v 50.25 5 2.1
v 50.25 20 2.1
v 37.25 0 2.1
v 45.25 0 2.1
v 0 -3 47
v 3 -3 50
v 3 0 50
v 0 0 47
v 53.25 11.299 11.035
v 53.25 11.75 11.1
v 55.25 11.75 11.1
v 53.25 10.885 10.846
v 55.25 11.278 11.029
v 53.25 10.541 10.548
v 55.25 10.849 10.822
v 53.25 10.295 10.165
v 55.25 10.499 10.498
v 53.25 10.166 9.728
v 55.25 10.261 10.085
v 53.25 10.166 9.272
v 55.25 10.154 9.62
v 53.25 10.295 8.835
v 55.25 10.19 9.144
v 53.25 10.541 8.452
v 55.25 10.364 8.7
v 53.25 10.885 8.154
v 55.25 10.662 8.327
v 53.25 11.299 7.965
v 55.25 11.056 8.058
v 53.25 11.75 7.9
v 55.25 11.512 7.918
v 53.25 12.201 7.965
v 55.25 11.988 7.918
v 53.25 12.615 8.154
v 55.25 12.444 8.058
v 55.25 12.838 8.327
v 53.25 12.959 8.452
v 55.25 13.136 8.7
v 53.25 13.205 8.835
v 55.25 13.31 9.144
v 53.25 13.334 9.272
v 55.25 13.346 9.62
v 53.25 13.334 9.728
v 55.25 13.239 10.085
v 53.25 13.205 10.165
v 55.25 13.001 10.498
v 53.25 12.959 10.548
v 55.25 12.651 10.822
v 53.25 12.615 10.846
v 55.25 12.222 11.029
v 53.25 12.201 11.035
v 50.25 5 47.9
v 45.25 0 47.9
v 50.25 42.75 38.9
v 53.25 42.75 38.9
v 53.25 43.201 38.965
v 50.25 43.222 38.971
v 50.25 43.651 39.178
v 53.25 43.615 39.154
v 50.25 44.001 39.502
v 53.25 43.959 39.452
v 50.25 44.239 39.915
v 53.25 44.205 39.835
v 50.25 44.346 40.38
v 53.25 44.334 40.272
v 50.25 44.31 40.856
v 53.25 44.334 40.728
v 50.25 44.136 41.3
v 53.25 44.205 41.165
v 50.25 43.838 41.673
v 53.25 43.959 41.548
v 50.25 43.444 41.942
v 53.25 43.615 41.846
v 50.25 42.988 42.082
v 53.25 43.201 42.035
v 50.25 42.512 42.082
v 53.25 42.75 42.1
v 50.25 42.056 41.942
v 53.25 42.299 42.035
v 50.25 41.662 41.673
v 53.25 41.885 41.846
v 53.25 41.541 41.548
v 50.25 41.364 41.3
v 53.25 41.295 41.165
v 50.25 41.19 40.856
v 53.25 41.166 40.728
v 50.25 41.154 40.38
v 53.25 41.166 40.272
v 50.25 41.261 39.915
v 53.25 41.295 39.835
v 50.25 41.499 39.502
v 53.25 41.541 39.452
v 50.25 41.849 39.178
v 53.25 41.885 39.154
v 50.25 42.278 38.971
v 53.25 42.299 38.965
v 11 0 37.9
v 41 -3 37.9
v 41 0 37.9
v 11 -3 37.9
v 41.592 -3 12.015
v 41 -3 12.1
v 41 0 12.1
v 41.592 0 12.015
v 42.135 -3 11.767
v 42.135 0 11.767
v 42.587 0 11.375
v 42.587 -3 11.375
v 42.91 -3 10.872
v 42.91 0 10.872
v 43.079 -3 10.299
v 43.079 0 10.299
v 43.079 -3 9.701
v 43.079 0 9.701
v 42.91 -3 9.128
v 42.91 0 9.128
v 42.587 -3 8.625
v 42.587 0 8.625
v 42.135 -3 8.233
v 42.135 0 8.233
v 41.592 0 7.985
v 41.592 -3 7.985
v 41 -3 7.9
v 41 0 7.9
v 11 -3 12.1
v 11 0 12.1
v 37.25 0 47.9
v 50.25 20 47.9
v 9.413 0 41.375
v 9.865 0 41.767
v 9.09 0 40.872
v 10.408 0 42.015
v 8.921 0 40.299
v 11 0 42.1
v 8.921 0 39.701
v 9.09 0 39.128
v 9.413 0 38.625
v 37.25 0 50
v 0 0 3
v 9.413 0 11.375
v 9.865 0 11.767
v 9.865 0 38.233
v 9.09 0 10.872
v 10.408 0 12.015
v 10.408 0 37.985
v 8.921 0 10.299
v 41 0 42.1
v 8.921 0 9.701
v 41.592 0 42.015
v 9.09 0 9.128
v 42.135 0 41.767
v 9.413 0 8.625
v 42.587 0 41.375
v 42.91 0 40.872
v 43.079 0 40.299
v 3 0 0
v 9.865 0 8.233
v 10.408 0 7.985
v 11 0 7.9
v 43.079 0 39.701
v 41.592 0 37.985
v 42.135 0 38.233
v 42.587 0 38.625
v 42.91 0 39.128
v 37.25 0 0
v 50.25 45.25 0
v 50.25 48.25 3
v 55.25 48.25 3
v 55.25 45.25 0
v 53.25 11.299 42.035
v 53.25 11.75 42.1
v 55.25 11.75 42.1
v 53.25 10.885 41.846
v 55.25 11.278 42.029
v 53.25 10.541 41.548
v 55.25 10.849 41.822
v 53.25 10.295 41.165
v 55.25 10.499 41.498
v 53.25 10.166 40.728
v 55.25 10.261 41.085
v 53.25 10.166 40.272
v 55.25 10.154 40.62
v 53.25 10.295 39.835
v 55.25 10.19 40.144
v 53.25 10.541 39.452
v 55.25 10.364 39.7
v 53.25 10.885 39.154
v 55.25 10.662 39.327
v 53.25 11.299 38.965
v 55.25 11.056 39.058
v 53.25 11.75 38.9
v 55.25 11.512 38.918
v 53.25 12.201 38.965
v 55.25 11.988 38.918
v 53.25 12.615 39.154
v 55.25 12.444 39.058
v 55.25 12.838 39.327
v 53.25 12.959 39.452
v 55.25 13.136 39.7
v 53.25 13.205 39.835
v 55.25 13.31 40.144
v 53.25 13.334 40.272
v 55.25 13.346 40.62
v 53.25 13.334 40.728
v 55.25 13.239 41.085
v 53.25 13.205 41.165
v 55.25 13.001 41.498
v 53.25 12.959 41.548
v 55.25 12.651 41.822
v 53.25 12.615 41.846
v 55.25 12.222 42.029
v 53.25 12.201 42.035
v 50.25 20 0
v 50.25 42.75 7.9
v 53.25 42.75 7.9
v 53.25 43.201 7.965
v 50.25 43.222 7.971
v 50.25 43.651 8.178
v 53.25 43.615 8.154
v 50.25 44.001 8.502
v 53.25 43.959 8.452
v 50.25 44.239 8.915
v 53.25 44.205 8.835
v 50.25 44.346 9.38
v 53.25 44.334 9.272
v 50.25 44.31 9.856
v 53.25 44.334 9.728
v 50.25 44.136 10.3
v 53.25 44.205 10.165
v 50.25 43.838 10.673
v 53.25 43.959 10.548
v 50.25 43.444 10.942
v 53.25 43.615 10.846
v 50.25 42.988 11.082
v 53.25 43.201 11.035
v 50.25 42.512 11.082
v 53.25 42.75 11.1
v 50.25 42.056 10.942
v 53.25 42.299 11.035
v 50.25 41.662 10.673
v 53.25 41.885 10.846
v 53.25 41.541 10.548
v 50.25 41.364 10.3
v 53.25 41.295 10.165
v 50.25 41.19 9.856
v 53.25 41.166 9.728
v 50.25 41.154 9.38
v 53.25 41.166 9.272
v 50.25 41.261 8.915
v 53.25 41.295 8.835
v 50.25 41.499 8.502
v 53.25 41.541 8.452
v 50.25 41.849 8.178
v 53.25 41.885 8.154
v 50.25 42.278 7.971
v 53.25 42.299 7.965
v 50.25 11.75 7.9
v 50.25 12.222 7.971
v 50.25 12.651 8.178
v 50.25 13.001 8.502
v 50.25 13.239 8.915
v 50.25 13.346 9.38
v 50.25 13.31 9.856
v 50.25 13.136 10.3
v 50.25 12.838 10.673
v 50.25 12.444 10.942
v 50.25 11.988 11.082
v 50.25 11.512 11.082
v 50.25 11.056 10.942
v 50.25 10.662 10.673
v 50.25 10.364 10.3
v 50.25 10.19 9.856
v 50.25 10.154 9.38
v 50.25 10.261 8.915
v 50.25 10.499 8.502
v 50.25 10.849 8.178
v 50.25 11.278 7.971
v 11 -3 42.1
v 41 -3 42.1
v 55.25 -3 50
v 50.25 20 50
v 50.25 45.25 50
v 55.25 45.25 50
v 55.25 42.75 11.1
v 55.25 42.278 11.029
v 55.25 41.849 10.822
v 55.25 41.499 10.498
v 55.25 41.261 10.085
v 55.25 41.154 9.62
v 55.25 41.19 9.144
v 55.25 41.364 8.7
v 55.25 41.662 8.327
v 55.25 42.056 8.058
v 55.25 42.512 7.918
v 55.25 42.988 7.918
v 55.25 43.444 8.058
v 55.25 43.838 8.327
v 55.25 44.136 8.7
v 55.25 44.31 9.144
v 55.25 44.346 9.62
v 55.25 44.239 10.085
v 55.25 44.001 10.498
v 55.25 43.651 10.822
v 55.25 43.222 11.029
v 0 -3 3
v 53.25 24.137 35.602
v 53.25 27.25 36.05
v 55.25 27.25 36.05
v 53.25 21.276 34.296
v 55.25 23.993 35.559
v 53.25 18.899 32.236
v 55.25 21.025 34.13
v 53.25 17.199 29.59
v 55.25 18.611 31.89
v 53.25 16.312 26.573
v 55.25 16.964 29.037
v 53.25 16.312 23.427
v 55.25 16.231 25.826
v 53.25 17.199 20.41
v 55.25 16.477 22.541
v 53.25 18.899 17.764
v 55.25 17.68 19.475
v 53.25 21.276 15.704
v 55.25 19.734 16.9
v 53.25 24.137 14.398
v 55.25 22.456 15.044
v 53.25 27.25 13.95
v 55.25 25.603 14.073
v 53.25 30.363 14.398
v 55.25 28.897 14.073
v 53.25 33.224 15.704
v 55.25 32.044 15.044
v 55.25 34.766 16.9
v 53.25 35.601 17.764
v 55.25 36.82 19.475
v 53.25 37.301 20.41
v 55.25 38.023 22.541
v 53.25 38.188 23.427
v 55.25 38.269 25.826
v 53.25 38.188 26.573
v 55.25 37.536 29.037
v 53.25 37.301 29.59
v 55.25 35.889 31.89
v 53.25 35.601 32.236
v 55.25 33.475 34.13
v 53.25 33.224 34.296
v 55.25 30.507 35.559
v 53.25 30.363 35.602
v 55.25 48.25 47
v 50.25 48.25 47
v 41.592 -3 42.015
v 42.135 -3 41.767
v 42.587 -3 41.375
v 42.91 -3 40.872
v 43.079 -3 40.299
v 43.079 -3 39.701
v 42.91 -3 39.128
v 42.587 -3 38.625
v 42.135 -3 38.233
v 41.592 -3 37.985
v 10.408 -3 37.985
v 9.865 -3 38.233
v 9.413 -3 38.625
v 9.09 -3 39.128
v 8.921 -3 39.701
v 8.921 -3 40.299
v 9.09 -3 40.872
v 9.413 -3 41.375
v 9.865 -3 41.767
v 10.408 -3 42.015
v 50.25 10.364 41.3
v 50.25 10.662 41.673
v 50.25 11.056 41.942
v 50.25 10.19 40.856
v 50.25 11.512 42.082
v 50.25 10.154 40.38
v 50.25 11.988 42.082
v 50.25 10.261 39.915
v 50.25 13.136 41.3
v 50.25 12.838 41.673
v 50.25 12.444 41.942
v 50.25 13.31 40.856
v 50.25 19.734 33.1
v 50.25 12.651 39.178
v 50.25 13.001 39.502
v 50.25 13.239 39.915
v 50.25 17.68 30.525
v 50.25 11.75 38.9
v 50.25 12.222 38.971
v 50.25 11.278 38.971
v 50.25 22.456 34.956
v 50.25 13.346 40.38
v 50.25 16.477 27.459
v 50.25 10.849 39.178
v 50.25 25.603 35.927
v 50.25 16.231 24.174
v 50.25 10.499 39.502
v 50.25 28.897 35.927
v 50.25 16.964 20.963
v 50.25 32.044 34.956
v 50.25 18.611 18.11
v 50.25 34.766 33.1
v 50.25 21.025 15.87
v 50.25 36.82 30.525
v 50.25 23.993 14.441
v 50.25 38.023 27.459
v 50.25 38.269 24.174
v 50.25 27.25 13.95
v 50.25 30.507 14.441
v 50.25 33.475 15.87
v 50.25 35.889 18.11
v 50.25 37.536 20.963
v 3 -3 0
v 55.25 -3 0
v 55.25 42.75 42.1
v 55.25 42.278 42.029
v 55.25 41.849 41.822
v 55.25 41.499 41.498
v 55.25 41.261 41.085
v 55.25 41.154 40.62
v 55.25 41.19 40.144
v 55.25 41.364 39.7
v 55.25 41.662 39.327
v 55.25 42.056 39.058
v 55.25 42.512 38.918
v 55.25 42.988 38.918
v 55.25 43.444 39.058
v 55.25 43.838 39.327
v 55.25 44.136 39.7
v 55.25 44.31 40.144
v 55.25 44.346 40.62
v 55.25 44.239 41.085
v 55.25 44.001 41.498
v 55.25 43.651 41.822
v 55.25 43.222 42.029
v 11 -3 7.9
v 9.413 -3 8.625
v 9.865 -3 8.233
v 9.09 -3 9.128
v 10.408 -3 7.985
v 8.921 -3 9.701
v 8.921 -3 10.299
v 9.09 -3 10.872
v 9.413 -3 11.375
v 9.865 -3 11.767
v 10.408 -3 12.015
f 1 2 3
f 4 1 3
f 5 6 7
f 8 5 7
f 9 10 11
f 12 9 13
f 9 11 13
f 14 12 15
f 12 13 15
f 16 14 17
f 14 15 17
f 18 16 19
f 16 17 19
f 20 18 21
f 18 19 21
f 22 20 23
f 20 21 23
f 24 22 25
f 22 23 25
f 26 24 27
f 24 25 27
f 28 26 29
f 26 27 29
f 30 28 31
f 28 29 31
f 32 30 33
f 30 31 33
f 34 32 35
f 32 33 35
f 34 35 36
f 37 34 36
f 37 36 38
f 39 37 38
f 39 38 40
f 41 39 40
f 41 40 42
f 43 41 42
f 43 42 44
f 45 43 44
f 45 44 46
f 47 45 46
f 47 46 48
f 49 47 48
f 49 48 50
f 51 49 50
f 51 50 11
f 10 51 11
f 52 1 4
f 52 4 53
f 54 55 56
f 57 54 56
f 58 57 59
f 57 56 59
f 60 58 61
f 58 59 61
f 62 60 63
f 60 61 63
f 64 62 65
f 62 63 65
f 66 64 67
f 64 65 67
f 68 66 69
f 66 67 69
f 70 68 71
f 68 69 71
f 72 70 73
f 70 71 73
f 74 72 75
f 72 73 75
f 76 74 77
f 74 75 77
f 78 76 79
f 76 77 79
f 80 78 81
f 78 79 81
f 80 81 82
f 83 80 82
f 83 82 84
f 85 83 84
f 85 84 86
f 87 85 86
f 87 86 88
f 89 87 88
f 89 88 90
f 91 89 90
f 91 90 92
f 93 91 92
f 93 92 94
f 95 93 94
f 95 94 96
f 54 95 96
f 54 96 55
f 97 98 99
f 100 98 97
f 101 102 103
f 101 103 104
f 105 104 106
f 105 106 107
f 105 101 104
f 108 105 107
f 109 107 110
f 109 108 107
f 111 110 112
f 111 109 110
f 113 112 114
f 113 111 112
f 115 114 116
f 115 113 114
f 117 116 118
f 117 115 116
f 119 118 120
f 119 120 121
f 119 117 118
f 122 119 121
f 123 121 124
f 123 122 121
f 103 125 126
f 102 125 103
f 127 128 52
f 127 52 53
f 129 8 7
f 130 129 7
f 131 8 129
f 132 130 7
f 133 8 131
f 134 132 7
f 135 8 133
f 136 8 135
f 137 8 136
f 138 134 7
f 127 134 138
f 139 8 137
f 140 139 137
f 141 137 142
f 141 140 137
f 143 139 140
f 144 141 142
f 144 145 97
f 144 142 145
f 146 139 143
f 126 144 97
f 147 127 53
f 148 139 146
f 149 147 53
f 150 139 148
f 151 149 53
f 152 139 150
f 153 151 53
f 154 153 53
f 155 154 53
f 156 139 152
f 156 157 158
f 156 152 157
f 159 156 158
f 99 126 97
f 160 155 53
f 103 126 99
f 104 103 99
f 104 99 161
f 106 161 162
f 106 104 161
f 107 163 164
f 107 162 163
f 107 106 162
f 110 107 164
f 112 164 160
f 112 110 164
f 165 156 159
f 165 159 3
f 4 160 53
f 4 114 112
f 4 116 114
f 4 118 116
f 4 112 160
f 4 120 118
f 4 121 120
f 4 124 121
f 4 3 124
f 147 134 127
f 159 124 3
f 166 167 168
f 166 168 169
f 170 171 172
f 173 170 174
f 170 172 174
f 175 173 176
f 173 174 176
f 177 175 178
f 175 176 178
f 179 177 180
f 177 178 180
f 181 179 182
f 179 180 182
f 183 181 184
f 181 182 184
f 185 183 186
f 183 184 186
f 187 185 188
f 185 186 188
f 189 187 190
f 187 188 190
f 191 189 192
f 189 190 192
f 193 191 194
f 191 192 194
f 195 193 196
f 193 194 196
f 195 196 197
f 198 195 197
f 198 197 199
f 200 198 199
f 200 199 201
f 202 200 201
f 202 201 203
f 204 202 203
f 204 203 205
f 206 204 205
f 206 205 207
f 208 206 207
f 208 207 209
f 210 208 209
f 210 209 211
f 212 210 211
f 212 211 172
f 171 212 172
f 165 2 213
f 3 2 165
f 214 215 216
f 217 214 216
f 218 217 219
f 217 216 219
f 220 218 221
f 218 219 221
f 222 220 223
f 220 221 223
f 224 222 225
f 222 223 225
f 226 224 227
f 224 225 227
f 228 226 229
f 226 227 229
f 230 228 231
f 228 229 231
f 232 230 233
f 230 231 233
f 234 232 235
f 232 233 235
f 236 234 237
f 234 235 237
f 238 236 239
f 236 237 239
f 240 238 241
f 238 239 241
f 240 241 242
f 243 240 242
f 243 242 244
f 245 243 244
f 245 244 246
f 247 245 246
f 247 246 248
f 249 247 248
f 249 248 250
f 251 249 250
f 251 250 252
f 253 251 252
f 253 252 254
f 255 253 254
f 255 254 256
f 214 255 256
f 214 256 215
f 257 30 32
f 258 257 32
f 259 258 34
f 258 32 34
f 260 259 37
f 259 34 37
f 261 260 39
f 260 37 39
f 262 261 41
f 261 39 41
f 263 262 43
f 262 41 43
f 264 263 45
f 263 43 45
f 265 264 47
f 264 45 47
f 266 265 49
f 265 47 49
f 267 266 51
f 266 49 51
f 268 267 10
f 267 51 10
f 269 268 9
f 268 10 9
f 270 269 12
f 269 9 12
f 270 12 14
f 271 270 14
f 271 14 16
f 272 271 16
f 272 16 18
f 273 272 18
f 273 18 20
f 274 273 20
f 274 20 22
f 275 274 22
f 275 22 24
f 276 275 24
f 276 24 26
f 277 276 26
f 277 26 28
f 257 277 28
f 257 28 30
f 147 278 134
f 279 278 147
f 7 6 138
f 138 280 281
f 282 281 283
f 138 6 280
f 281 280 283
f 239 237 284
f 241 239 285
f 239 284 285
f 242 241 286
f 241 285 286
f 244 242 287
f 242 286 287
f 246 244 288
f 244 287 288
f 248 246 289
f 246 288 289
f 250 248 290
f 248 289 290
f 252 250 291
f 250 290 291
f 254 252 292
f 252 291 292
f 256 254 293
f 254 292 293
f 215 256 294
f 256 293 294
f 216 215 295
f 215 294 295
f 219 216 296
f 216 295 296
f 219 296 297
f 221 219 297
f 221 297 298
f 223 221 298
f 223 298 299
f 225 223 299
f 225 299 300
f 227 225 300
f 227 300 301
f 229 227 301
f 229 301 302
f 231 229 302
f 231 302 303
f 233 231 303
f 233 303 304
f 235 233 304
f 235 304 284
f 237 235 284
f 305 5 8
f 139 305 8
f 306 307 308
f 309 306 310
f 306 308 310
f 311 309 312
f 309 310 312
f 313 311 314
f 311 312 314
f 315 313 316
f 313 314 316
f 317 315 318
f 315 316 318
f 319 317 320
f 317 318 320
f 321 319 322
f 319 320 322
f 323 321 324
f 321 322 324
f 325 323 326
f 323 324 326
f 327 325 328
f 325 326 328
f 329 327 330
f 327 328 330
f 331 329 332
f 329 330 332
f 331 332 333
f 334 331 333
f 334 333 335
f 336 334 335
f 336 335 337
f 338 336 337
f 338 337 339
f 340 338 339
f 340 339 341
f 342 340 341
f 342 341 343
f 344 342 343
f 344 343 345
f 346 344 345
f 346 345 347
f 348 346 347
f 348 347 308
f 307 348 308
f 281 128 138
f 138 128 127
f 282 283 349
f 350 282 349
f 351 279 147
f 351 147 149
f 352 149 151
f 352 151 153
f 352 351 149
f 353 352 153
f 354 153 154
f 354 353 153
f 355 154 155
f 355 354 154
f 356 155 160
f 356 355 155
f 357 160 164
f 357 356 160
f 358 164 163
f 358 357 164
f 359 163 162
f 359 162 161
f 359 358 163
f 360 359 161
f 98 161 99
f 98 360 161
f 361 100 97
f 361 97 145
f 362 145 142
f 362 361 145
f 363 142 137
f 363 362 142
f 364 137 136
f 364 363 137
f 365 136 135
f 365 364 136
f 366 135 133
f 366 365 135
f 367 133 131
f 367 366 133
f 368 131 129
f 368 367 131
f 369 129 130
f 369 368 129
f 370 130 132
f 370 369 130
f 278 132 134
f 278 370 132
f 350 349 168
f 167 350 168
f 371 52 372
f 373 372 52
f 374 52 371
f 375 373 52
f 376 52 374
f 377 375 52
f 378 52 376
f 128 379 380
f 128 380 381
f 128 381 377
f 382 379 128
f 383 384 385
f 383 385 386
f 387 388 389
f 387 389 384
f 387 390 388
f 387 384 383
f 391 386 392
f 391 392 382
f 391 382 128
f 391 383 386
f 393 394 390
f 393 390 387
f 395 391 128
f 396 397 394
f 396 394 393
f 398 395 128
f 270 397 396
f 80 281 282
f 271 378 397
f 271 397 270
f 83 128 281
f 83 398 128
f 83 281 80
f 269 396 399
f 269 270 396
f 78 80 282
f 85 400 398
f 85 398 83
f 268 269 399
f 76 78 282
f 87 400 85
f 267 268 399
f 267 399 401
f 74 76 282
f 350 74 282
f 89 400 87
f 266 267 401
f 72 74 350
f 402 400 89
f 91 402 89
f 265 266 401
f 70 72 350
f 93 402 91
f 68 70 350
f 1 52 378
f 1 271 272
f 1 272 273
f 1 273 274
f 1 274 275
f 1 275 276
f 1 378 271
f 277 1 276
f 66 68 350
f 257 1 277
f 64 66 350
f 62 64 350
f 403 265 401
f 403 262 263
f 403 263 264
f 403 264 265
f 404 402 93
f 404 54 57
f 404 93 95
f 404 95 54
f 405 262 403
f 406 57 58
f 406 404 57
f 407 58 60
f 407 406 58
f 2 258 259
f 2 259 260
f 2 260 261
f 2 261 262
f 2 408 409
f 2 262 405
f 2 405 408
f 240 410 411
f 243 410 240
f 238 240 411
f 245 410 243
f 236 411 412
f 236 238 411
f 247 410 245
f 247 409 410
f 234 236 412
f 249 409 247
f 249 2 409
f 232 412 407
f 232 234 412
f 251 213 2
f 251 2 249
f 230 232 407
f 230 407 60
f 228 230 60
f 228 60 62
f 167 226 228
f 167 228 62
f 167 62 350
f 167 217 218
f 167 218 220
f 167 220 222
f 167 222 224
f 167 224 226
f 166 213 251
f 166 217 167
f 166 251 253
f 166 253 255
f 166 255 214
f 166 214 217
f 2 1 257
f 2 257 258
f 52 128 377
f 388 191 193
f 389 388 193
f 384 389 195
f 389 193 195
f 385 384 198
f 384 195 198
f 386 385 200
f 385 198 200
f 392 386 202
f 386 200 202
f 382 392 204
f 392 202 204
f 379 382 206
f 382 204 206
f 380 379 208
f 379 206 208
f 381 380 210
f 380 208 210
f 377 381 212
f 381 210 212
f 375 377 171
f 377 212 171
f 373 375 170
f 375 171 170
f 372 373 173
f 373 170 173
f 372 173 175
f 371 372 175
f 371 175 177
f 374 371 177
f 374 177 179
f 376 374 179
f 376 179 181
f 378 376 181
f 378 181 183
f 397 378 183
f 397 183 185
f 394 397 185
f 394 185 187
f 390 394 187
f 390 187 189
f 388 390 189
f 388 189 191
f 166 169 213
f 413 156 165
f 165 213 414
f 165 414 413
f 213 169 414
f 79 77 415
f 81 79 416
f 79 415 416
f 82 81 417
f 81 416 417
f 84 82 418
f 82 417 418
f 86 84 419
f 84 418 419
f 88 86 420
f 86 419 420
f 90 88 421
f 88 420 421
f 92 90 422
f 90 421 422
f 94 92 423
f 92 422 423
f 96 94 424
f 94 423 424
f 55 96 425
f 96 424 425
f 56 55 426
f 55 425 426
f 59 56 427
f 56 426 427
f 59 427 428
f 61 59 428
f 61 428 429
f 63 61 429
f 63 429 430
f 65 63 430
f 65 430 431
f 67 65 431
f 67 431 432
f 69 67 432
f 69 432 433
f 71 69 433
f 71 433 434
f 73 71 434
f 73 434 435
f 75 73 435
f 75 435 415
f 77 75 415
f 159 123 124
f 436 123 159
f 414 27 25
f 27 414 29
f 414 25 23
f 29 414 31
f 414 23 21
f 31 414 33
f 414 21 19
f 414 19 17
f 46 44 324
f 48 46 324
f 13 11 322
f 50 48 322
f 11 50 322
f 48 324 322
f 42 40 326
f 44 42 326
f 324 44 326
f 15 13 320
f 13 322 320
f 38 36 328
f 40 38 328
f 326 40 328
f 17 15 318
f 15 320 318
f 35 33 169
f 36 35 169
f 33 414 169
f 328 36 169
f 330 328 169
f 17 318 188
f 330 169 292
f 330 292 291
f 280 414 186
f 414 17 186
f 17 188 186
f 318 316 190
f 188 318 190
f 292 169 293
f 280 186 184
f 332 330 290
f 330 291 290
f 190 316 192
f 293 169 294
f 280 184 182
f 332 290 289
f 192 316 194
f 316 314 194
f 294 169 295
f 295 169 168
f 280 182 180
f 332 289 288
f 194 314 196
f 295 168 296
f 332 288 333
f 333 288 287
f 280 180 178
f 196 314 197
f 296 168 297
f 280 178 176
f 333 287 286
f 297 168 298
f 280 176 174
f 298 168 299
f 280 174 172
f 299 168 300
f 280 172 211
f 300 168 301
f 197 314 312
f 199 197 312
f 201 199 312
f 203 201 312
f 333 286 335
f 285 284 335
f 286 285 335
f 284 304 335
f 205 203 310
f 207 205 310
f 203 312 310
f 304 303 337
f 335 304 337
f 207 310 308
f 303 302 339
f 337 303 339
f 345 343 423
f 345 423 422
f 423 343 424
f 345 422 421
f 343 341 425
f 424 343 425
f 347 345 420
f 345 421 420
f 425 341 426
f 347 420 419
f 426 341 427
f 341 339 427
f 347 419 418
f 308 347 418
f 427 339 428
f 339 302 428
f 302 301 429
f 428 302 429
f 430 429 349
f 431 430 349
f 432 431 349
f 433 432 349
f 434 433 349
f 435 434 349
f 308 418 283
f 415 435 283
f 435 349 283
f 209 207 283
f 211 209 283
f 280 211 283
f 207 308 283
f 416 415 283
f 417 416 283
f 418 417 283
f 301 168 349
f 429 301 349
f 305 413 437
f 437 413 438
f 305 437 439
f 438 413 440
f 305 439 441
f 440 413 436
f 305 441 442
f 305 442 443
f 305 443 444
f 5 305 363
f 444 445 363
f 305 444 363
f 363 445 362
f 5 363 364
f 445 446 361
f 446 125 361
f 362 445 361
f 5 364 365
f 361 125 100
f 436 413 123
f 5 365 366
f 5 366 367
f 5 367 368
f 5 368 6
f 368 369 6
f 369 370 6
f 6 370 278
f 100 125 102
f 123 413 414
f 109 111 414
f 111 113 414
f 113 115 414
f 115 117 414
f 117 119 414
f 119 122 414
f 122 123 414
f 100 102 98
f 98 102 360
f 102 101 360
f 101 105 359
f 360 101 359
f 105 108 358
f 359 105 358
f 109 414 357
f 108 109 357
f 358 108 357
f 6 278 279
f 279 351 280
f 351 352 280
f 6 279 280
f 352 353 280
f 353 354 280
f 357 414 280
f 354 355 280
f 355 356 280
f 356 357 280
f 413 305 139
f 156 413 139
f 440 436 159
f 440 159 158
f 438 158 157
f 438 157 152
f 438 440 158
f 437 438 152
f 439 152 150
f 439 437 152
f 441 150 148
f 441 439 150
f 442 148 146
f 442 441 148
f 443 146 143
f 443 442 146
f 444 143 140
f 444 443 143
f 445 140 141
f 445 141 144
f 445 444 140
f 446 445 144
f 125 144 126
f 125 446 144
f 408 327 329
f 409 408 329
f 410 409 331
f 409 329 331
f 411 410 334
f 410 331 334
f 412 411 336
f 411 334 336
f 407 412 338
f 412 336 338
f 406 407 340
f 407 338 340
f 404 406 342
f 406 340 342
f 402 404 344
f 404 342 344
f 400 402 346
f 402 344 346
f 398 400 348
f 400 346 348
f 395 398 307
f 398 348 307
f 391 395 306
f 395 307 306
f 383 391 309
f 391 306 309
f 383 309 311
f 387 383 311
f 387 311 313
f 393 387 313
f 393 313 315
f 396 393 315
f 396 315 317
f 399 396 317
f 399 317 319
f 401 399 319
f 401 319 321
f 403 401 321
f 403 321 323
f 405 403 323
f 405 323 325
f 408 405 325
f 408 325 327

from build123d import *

# Parameters (mm, degrees)
EXTRUDE_1_DEPTH             = 50
HOLE_WIZARD_1_D             = 22.1
HOLE_WIZARD_1_DEPTH         = 100
HOLE_WIZARD_2_D             = 3.2
HOLE_WIZARD_2_DEPTH         = 100
HOLE_START                  = -3
HOLE_WIZARD_4_2_4_2_1_DEPTH = 3
RIB_1_REACH                 = 89.542
SKETCH_13_WALL_W            = 200.93798631
SKETCH_13_WALL_H            = 2.1
CHAMFER_1_SIZE              = 3
EXTRUDE_START               = 2
SKETCH_14_R                 = 1.6
SKETCH_14_R_2               = 11.05
EXTRUDE_2_DEPTH             = 2
CHAMFER_2_SIZE              = 5


# Read off the part's stored shape, not the designer's step: Ø4.2 (4.2) 直径槽口1
with BuildPart() as part:
    # 草图1 → 凸台-拉伸1 (new body)
    with BuildSketch(Plane.XY):
        Polygon((0, 0), (50.25, 0), (50.25, 48.25), (53.25, 48.25), (53.25, -3), (0, -3), align=None)
    extrude(amount=EXTRUDE_1_DEPTH)

    # 孔1
    with Locations(Plane.ZY.offset(-50.25)):
        with Locations((25, 27.25)):
            Hole(HOLE_WIZARD_1_D / 2, depth=HOLE_WIZARD_1_DEPTH)

    # 孔2
    with Locations(Plane.ZY.offset(-50.25)):
        with Locations((9.5, 42.75), (40.5, 42.75), (40.5, 11.75), (9.5, 11.75)):
            Hole(HOLE_WIZARD_2_D / 2, depth=HOLE_WIZARD_2_DEPTH)

    # Ø4.2 (4.2) 直径槽口1 outline → Ø4.2 (4.2) 直径槽口1 (cut)
    with BuildSketch(Plane(origin=(0, 0, 0), x_dir=(1, 0, 0), z_dir=(0, 1, 0)).offset(HOLE_START)):
        with BuildLine():
            Line((11, -42.1), (41, -42.1))
            ThreePointArc((41, -42.1), (43.1, -40), (41, -37.9))
            Line((41, -37.9), (11, -37.9))
            ThreePointArc((11, -37.9), (8.9, -40), (11, -42.1))
        make_face()
        with BuildLine():
            Line((11, -12.1), (41, -12.1))
            ThreePointArc((41, -12.1), (43.1, -10), (41, -7.9))
            Line((41, -7.9), (11, -7.9))
            ThreePointArc((11, -7.9), (8.9, -10), (11, -12.1))
        make_face()
    extrude(amount=HOLE_WIZARD_4_2_4_2_1_DEPTH, mode=Mode.SUBTRACT)

    # 草图13 wall → 筋1 (add, up to next)
    with BuildSketch(Plane(origin=(43.75, 10, 50), x_dir=(-0.544988350595, -0.838443616301, 0), z_dir=(0.838443616301, -0.544988350595, 0)), mode=Mode.PRIVATE) as rib_1_sk1:
        with Locations((0, 1.05)):
            Rectangle(SKETCH_13_WALL_W, SKETCH_13_WALL_H)
    rib_1_tool1 = extrude(rib_1_sk1.sketch, amount=RIB_1_REACH, mode=Mode.PRIVATE) - part.part
    rib_1 = rib_1_tool1.solids().sort_by_distance((43.75, 10, 50))[0]
    add(rib_1)

    # 镜向1: 筋1 across plane
    add(rib_1.mirror(Plane.XY.offset(25)))

    # 倒角1
    chamfer_1_edges = [part.edges().sort_by_distance(p)[0] for p in [
        (51.75, 48.25, 50),
        (0, -1.5, 50),
        (51.75, 48.25, 0),
        (0, -1.5, 0),
    ]]
    chamfer(chamfer_1_edges, length=CHAMFER_1_SIZE)

    # 草图14 → 凸台-拉伸2 (add)
    with BuildSketch(Plane(origin=(53.25, 0, 0), x_dir=(0, 0, -1), z_dir=(1, 0, 0)).offset(EXTRUDE_START)):
        Polygon((-47, 48.25), (-3, 48.25), (0, 45.25), (0, -3), (-50, -3), (-50, 45.25), align=None)
        with Locations(Location((-9.5, 42.75, 0), (0, 0, 180))):
            Circle(SKETCH_14_R, mode=Mode.SUBTRACT)
        with Locations(Location((-40.5, 42.75, 0), (0, 0, 180))):
            Circle(SKETCH_14_R, mode=Mode.SUBTRACT)
        with Locations(Location((-25, 27.25, 0), (0, 0, 180))):
            Circle(SKETCH_14_R_2, mode=Mode.SUBTRACT)
        with Locations(Location((-9.5, 11.75, 0), (0, 0, 180))):
            Circle(SKETCH_14_R, mode=Mode.SUBTRACT)
        with Locations(Location((-40.5, 11.75, 0), (0, 0, 180))):
            Circle(SKETCH_14_R, mode=Mode.SUBTRACT)
    extrude(amount=-EXTRUDE_2_DEPTH)

    # 倒角2
    chamfer_2_edges = [part.edges().sort_by_distance(p)[0] for p in [
        (50.25, 0, 25),
    ]]
    chamfer(chamfer_2_edges, length=CHAMFER_2_SIZE)


solid = part.part
